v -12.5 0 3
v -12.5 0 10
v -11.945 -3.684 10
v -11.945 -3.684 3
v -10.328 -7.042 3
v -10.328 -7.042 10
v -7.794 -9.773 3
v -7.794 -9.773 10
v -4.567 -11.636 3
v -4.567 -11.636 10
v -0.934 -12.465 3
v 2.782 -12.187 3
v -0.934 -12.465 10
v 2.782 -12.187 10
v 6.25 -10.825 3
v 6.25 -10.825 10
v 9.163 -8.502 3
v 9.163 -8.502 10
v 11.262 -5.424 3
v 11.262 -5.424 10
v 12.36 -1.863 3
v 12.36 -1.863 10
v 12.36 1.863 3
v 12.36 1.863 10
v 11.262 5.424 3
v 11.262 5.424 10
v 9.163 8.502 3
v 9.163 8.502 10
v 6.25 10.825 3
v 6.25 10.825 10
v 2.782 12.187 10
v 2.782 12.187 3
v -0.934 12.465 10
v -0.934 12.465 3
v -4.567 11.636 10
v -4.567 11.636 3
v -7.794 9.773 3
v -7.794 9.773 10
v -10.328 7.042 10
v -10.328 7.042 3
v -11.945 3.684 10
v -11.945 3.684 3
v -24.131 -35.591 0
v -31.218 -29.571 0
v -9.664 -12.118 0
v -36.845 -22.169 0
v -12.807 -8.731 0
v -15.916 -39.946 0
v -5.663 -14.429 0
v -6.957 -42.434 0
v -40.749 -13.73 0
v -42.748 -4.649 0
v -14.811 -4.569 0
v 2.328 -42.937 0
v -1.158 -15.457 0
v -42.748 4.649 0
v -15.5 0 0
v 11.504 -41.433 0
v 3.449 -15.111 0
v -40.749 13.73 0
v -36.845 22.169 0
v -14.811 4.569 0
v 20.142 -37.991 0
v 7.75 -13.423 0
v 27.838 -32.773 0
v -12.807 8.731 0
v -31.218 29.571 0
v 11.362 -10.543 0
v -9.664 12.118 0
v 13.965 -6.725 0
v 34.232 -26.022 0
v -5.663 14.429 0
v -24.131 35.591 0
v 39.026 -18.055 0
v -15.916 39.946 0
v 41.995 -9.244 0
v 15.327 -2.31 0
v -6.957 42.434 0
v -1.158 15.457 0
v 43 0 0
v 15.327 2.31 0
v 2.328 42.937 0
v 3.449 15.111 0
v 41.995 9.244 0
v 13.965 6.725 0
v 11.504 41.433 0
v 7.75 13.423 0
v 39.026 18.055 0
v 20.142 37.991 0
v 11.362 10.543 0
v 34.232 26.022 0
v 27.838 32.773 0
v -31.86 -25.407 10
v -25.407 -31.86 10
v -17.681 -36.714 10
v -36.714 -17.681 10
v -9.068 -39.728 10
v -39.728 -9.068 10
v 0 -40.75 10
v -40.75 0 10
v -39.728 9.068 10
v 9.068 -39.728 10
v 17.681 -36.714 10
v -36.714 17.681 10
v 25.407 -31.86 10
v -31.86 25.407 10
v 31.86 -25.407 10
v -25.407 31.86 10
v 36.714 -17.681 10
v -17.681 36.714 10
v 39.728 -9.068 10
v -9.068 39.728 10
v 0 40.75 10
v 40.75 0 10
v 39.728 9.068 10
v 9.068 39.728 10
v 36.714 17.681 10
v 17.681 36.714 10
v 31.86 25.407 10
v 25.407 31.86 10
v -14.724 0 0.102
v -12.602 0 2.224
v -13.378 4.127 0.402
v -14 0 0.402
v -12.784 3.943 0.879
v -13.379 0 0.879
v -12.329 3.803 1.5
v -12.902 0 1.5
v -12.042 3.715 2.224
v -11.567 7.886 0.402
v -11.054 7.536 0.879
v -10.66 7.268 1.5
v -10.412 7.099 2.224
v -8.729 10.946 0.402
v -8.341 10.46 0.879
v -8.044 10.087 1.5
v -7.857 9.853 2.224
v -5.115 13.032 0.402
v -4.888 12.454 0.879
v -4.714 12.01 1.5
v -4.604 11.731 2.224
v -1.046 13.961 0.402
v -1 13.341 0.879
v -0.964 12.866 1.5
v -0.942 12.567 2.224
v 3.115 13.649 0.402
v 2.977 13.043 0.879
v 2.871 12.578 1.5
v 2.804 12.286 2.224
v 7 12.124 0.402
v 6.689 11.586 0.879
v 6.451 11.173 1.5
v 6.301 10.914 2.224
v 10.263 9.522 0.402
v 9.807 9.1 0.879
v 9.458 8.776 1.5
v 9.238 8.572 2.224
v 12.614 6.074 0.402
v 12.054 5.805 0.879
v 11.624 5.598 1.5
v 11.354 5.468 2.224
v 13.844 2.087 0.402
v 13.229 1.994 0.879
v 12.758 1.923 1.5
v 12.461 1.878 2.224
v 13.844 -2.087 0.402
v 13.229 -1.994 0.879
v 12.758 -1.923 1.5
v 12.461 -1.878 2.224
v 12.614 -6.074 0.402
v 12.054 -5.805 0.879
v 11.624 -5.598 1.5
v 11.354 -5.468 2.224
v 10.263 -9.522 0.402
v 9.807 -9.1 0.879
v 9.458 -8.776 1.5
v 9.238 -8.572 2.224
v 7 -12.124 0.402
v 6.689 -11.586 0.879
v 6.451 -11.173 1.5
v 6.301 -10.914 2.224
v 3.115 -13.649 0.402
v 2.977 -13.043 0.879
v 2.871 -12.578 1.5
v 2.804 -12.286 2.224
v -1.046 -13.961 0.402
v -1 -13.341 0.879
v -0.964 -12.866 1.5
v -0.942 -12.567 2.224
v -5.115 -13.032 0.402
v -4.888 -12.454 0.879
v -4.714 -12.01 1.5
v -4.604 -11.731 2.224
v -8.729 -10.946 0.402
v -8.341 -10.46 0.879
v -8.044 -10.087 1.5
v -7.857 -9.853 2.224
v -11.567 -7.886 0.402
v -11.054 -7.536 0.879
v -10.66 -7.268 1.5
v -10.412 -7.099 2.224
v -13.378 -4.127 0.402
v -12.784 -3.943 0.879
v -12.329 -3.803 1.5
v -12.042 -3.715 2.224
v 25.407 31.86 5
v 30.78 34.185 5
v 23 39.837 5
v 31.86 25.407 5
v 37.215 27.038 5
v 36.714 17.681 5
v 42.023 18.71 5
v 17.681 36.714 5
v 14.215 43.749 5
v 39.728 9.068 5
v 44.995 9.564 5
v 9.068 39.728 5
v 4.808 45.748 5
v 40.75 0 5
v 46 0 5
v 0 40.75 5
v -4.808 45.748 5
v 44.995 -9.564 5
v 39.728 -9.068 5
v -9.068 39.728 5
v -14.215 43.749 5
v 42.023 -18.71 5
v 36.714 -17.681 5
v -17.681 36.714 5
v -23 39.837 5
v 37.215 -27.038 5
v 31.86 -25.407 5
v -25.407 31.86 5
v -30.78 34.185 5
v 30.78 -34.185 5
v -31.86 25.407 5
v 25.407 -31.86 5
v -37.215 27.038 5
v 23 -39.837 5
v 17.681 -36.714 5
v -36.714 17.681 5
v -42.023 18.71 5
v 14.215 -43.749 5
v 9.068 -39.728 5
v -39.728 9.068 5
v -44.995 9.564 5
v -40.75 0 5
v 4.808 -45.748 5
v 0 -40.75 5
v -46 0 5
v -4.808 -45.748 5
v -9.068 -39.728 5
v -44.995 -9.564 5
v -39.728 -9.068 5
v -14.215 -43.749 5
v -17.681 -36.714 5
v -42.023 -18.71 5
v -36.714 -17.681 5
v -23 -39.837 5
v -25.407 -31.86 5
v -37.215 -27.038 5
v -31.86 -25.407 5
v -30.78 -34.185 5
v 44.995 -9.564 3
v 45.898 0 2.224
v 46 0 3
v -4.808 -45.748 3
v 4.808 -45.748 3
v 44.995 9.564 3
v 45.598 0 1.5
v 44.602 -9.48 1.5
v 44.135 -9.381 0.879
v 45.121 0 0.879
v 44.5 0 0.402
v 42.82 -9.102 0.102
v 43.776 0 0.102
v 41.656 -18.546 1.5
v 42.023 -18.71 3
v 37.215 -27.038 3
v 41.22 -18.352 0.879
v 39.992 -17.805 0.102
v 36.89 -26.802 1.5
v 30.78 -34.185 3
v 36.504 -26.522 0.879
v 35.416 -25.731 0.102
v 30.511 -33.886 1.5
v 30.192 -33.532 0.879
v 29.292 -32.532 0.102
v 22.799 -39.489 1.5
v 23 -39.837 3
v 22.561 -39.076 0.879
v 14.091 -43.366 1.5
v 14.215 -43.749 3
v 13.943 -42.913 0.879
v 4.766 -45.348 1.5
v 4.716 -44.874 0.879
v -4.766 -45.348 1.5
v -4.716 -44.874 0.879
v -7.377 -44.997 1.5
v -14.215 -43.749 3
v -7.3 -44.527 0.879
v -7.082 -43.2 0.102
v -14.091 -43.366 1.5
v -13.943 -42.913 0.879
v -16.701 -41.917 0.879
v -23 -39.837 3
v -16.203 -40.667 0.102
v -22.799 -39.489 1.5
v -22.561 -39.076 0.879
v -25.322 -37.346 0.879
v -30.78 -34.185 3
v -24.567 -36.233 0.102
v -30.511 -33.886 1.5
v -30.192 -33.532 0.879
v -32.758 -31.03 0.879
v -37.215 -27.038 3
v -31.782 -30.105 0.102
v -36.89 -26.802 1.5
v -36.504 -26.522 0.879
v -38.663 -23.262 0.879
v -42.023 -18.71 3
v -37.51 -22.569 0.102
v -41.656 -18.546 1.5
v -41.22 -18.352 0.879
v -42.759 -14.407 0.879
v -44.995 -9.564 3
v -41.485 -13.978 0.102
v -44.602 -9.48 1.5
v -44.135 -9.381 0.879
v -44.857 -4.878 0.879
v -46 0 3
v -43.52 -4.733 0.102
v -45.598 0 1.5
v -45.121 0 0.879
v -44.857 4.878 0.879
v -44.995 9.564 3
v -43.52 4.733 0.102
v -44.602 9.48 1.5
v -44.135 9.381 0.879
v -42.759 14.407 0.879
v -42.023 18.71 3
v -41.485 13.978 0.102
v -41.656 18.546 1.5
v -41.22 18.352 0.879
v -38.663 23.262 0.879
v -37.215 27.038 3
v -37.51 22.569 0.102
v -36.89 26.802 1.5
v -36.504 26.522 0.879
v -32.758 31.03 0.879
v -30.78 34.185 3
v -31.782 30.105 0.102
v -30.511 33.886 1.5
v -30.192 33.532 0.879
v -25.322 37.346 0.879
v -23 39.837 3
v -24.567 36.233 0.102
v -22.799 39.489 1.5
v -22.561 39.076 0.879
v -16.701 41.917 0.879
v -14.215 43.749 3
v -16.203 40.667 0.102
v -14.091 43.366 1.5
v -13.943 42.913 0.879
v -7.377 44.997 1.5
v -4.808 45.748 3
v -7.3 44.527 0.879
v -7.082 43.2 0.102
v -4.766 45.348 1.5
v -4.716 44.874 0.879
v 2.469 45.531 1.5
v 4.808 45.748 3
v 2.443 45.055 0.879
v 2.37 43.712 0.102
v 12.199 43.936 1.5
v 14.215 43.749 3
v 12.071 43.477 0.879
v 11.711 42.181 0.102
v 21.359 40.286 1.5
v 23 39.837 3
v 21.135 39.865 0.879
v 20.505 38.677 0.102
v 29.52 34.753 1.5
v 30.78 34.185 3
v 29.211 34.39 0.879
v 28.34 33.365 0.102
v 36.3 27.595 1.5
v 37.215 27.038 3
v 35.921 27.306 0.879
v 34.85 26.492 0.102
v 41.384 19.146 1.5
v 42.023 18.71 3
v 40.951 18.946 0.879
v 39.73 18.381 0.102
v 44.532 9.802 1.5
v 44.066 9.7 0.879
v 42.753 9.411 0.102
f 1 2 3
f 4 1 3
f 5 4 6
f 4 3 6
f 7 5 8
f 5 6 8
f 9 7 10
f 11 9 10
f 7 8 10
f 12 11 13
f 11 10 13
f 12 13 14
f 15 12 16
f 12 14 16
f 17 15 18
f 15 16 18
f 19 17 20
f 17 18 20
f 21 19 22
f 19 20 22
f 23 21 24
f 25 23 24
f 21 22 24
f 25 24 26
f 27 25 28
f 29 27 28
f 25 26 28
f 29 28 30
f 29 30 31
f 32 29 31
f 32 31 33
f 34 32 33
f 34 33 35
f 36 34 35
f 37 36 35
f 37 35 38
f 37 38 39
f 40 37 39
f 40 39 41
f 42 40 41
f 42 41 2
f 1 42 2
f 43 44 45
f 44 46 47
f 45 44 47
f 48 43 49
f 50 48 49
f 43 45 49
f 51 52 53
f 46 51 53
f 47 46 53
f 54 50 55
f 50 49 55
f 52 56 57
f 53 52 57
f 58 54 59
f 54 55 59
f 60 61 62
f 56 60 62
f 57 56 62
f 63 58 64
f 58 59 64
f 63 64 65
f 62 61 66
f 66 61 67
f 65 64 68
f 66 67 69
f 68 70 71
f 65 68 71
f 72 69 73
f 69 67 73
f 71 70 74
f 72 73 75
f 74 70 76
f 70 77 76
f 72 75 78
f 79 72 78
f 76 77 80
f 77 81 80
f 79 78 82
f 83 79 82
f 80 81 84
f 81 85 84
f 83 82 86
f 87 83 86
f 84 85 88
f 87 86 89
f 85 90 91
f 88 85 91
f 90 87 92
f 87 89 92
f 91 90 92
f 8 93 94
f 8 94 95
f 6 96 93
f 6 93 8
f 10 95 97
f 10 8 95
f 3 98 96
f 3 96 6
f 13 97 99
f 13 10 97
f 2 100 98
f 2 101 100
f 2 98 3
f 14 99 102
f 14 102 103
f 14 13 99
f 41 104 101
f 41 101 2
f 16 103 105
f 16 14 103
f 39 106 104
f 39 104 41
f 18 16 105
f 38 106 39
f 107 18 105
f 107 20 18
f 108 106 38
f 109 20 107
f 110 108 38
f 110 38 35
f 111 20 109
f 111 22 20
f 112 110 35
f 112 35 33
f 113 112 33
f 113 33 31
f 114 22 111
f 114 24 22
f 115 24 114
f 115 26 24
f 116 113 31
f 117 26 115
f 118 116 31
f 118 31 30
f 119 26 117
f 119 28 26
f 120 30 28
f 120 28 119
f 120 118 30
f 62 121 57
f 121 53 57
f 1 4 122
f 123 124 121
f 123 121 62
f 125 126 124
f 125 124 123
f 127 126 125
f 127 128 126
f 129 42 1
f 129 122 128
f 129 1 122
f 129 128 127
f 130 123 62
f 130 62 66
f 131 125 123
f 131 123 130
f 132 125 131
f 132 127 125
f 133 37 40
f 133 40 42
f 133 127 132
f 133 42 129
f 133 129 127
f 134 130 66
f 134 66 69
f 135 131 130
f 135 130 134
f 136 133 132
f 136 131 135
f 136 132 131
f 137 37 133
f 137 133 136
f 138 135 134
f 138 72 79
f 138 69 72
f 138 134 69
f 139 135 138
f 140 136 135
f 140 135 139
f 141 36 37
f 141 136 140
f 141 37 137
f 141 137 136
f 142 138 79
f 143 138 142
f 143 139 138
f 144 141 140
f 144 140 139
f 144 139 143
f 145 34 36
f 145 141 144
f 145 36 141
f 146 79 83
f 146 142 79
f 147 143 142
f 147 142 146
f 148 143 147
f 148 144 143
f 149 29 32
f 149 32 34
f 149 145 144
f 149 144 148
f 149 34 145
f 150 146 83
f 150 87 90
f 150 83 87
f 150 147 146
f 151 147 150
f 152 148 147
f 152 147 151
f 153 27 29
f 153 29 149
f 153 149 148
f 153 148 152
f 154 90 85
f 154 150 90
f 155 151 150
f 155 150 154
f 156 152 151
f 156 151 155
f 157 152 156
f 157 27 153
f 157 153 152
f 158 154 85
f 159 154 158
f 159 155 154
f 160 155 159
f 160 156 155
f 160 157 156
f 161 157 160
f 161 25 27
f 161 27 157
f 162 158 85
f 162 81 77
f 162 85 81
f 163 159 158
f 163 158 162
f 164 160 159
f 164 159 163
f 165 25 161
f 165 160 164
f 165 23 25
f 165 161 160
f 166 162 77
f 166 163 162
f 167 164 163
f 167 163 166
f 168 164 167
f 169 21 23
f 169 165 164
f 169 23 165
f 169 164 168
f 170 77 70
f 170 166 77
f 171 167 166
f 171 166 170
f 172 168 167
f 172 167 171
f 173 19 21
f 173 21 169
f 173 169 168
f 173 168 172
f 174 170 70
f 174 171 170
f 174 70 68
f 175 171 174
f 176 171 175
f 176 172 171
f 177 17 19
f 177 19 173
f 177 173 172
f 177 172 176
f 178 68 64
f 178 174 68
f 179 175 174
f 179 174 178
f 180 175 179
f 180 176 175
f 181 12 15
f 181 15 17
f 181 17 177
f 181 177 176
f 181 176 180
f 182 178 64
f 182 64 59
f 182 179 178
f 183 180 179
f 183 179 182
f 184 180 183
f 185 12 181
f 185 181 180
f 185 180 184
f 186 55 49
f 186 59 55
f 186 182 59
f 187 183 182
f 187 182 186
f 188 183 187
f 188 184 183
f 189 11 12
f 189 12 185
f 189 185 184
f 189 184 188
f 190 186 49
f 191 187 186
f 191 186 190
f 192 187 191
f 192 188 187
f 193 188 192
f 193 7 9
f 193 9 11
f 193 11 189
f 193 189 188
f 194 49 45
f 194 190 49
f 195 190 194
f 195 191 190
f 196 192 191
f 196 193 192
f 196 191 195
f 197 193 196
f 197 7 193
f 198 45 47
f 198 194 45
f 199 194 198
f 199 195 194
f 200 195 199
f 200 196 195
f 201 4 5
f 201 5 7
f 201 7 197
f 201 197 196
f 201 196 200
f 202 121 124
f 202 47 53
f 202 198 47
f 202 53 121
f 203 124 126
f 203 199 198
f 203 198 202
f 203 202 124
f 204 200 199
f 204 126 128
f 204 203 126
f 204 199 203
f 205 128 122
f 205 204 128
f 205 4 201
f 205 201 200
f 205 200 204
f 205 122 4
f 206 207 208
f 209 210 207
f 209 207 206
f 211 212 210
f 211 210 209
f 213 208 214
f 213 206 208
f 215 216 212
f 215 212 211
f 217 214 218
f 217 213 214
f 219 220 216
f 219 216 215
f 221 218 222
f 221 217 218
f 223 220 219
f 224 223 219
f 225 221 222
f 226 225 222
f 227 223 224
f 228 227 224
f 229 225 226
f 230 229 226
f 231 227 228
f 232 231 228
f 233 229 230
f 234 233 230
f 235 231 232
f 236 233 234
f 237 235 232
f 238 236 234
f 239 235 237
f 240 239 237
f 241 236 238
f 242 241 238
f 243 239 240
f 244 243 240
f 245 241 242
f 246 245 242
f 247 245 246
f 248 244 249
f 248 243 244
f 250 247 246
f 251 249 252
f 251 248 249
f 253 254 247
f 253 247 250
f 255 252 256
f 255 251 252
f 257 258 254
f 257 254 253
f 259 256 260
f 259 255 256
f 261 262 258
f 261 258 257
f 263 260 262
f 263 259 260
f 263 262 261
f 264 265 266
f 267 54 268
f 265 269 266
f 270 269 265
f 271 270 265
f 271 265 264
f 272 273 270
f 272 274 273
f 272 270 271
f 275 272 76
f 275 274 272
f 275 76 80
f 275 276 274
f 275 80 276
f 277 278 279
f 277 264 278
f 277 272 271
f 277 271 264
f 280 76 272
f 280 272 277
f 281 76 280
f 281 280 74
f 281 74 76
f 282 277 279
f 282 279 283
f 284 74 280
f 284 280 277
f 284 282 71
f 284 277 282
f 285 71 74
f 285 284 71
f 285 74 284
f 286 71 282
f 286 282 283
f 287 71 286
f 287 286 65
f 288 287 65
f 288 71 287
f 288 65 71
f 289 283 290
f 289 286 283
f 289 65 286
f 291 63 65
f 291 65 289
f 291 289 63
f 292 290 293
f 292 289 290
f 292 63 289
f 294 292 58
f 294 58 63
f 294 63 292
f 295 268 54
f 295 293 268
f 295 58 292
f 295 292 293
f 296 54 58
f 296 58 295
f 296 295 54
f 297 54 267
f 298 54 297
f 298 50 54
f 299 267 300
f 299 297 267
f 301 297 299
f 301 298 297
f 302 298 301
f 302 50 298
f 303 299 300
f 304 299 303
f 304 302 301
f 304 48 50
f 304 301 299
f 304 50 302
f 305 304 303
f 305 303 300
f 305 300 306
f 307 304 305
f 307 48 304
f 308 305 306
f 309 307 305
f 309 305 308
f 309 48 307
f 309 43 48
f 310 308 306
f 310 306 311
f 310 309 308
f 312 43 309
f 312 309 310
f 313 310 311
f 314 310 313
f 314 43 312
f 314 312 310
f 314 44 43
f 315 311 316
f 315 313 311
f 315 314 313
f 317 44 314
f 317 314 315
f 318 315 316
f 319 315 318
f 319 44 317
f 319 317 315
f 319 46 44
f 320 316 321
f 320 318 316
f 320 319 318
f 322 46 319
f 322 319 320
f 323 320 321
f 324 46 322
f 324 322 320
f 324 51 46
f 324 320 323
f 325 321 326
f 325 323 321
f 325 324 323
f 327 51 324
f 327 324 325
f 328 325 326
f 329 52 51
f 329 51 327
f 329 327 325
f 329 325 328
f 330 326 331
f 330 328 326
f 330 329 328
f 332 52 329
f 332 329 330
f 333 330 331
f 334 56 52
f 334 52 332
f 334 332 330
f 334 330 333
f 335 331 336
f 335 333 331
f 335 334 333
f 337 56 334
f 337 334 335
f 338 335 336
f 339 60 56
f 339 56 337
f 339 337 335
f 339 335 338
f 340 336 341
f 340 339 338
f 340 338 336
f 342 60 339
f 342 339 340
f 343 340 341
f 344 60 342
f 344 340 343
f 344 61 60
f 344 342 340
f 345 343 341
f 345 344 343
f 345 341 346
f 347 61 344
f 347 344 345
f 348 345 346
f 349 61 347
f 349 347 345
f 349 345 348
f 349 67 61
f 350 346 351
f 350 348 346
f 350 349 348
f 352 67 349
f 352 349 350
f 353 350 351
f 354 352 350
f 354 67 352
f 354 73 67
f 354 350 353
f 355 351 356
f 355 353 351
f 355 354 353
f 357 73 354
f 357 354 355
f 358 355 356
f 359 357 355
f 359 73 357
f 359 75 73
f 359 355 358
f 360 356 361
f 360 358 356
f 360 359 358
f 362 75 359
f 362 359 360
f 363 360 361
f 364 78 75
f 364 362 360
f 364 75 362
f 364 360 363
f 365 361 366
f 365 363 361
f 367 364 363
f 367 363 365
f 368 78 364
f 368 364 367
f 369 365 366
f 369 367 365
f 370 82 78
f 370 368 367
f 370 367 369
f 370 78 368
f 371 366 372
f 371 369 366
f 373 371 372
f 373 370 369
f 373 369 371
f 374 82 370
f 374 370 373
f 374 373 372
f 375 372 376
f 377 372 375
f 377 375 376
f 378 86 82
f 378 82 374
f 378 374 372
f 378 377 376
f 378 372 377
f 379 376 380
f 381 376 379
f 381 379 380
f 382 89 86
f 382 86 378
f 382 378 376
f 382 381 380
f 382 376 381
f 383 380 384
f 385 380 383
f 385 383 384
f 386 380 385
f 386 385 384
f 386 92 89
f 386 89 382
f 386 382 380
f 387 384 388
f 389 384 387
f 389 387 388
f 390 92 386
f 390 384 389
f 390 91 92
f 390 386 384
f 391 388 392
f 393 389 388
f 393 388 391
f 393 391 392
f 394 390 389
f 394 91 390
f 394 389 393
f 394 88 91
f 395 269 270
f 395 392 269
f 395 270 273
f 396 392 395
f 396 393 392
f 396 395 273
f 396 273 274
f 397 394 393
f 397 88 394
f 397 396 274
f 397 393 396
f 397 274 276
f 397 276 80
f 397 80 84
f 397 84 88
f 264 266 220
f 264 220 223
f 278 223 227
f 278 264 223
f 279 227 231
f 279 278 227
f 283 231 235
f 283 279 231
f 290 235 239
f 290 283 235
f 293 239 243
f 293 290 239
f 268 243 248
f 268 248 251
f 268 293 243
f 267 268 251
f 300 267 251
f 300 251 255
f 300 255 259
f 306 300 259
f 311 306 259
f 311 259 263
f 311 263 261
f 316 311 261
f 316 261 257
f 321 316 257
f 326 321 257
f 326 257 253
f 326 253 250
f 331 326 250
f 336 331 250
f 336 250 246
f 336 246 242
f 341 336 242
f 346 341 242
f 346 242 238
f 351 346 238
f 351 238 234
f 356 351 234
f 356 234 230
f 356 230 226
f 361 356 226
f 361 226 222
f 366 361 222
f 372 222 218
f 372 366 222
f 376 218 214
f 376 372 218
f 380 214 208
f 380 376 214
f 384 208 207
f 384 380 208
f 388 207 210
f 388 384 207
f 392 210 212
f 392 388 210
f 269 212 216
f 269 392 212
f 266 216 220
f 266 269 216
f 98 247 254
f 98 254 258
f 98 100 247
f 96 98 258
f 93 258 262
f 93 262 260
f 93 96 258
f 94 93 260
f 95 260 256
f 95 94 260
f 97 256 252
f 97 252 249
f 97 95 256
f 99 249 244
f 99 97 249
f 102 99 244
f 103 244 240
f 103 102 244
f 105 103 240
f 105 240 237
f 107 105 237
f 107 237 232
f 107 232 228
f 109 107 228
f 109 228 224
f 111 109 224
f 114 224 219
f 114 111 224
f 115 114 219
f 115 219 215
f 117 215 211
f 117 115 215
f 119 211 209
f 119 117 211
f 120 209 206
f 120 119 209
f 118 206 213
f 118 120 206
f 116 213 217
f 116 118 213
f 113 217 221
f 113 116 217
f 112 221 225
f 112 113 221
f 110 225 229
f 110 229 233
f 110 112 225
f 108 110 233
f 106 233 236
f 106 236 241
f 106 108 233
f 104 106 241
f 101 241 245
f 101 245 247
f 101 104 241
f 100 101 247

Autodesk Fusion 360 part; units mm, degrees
sketch "スケッチ1" plane through (0, 0, 0) normal (0, 0, 1) x (1, 0, 0)
  circle A0 centre (0, 0) radius 46
  dimension "d1" = 92
extrude "押し出し1" add sketch "スケッチ1" along normal blind 10
sketch "スケッチ2" plane through (0, 0, 10) normal (0, 0, 1) x (-1, 0, 0)
  circle A0 centre (0, 0) radius 46
  circle A1 centre (0, 0) radius 40.75
  dimension "d4" = 81.5
extrude "押し出し2" cut sketch "スケッチ2" against normal blind 5
sketch "スケッチ3" plane through (0, 0, 10) normal (0, 0, 1) x (-1, 0, 0)
  circle A0 centre (0, 0) radius 40.75
  circle A1 centre (0, 0) radius 12.5
  dimension "d7" = 25
extrude "押し出し3" cut sketch "スケッチ3" against normal blind 10 contours A1
fillet "フィレット1" radius 3 1 faces at (34.6155, -2.9063, 0)
